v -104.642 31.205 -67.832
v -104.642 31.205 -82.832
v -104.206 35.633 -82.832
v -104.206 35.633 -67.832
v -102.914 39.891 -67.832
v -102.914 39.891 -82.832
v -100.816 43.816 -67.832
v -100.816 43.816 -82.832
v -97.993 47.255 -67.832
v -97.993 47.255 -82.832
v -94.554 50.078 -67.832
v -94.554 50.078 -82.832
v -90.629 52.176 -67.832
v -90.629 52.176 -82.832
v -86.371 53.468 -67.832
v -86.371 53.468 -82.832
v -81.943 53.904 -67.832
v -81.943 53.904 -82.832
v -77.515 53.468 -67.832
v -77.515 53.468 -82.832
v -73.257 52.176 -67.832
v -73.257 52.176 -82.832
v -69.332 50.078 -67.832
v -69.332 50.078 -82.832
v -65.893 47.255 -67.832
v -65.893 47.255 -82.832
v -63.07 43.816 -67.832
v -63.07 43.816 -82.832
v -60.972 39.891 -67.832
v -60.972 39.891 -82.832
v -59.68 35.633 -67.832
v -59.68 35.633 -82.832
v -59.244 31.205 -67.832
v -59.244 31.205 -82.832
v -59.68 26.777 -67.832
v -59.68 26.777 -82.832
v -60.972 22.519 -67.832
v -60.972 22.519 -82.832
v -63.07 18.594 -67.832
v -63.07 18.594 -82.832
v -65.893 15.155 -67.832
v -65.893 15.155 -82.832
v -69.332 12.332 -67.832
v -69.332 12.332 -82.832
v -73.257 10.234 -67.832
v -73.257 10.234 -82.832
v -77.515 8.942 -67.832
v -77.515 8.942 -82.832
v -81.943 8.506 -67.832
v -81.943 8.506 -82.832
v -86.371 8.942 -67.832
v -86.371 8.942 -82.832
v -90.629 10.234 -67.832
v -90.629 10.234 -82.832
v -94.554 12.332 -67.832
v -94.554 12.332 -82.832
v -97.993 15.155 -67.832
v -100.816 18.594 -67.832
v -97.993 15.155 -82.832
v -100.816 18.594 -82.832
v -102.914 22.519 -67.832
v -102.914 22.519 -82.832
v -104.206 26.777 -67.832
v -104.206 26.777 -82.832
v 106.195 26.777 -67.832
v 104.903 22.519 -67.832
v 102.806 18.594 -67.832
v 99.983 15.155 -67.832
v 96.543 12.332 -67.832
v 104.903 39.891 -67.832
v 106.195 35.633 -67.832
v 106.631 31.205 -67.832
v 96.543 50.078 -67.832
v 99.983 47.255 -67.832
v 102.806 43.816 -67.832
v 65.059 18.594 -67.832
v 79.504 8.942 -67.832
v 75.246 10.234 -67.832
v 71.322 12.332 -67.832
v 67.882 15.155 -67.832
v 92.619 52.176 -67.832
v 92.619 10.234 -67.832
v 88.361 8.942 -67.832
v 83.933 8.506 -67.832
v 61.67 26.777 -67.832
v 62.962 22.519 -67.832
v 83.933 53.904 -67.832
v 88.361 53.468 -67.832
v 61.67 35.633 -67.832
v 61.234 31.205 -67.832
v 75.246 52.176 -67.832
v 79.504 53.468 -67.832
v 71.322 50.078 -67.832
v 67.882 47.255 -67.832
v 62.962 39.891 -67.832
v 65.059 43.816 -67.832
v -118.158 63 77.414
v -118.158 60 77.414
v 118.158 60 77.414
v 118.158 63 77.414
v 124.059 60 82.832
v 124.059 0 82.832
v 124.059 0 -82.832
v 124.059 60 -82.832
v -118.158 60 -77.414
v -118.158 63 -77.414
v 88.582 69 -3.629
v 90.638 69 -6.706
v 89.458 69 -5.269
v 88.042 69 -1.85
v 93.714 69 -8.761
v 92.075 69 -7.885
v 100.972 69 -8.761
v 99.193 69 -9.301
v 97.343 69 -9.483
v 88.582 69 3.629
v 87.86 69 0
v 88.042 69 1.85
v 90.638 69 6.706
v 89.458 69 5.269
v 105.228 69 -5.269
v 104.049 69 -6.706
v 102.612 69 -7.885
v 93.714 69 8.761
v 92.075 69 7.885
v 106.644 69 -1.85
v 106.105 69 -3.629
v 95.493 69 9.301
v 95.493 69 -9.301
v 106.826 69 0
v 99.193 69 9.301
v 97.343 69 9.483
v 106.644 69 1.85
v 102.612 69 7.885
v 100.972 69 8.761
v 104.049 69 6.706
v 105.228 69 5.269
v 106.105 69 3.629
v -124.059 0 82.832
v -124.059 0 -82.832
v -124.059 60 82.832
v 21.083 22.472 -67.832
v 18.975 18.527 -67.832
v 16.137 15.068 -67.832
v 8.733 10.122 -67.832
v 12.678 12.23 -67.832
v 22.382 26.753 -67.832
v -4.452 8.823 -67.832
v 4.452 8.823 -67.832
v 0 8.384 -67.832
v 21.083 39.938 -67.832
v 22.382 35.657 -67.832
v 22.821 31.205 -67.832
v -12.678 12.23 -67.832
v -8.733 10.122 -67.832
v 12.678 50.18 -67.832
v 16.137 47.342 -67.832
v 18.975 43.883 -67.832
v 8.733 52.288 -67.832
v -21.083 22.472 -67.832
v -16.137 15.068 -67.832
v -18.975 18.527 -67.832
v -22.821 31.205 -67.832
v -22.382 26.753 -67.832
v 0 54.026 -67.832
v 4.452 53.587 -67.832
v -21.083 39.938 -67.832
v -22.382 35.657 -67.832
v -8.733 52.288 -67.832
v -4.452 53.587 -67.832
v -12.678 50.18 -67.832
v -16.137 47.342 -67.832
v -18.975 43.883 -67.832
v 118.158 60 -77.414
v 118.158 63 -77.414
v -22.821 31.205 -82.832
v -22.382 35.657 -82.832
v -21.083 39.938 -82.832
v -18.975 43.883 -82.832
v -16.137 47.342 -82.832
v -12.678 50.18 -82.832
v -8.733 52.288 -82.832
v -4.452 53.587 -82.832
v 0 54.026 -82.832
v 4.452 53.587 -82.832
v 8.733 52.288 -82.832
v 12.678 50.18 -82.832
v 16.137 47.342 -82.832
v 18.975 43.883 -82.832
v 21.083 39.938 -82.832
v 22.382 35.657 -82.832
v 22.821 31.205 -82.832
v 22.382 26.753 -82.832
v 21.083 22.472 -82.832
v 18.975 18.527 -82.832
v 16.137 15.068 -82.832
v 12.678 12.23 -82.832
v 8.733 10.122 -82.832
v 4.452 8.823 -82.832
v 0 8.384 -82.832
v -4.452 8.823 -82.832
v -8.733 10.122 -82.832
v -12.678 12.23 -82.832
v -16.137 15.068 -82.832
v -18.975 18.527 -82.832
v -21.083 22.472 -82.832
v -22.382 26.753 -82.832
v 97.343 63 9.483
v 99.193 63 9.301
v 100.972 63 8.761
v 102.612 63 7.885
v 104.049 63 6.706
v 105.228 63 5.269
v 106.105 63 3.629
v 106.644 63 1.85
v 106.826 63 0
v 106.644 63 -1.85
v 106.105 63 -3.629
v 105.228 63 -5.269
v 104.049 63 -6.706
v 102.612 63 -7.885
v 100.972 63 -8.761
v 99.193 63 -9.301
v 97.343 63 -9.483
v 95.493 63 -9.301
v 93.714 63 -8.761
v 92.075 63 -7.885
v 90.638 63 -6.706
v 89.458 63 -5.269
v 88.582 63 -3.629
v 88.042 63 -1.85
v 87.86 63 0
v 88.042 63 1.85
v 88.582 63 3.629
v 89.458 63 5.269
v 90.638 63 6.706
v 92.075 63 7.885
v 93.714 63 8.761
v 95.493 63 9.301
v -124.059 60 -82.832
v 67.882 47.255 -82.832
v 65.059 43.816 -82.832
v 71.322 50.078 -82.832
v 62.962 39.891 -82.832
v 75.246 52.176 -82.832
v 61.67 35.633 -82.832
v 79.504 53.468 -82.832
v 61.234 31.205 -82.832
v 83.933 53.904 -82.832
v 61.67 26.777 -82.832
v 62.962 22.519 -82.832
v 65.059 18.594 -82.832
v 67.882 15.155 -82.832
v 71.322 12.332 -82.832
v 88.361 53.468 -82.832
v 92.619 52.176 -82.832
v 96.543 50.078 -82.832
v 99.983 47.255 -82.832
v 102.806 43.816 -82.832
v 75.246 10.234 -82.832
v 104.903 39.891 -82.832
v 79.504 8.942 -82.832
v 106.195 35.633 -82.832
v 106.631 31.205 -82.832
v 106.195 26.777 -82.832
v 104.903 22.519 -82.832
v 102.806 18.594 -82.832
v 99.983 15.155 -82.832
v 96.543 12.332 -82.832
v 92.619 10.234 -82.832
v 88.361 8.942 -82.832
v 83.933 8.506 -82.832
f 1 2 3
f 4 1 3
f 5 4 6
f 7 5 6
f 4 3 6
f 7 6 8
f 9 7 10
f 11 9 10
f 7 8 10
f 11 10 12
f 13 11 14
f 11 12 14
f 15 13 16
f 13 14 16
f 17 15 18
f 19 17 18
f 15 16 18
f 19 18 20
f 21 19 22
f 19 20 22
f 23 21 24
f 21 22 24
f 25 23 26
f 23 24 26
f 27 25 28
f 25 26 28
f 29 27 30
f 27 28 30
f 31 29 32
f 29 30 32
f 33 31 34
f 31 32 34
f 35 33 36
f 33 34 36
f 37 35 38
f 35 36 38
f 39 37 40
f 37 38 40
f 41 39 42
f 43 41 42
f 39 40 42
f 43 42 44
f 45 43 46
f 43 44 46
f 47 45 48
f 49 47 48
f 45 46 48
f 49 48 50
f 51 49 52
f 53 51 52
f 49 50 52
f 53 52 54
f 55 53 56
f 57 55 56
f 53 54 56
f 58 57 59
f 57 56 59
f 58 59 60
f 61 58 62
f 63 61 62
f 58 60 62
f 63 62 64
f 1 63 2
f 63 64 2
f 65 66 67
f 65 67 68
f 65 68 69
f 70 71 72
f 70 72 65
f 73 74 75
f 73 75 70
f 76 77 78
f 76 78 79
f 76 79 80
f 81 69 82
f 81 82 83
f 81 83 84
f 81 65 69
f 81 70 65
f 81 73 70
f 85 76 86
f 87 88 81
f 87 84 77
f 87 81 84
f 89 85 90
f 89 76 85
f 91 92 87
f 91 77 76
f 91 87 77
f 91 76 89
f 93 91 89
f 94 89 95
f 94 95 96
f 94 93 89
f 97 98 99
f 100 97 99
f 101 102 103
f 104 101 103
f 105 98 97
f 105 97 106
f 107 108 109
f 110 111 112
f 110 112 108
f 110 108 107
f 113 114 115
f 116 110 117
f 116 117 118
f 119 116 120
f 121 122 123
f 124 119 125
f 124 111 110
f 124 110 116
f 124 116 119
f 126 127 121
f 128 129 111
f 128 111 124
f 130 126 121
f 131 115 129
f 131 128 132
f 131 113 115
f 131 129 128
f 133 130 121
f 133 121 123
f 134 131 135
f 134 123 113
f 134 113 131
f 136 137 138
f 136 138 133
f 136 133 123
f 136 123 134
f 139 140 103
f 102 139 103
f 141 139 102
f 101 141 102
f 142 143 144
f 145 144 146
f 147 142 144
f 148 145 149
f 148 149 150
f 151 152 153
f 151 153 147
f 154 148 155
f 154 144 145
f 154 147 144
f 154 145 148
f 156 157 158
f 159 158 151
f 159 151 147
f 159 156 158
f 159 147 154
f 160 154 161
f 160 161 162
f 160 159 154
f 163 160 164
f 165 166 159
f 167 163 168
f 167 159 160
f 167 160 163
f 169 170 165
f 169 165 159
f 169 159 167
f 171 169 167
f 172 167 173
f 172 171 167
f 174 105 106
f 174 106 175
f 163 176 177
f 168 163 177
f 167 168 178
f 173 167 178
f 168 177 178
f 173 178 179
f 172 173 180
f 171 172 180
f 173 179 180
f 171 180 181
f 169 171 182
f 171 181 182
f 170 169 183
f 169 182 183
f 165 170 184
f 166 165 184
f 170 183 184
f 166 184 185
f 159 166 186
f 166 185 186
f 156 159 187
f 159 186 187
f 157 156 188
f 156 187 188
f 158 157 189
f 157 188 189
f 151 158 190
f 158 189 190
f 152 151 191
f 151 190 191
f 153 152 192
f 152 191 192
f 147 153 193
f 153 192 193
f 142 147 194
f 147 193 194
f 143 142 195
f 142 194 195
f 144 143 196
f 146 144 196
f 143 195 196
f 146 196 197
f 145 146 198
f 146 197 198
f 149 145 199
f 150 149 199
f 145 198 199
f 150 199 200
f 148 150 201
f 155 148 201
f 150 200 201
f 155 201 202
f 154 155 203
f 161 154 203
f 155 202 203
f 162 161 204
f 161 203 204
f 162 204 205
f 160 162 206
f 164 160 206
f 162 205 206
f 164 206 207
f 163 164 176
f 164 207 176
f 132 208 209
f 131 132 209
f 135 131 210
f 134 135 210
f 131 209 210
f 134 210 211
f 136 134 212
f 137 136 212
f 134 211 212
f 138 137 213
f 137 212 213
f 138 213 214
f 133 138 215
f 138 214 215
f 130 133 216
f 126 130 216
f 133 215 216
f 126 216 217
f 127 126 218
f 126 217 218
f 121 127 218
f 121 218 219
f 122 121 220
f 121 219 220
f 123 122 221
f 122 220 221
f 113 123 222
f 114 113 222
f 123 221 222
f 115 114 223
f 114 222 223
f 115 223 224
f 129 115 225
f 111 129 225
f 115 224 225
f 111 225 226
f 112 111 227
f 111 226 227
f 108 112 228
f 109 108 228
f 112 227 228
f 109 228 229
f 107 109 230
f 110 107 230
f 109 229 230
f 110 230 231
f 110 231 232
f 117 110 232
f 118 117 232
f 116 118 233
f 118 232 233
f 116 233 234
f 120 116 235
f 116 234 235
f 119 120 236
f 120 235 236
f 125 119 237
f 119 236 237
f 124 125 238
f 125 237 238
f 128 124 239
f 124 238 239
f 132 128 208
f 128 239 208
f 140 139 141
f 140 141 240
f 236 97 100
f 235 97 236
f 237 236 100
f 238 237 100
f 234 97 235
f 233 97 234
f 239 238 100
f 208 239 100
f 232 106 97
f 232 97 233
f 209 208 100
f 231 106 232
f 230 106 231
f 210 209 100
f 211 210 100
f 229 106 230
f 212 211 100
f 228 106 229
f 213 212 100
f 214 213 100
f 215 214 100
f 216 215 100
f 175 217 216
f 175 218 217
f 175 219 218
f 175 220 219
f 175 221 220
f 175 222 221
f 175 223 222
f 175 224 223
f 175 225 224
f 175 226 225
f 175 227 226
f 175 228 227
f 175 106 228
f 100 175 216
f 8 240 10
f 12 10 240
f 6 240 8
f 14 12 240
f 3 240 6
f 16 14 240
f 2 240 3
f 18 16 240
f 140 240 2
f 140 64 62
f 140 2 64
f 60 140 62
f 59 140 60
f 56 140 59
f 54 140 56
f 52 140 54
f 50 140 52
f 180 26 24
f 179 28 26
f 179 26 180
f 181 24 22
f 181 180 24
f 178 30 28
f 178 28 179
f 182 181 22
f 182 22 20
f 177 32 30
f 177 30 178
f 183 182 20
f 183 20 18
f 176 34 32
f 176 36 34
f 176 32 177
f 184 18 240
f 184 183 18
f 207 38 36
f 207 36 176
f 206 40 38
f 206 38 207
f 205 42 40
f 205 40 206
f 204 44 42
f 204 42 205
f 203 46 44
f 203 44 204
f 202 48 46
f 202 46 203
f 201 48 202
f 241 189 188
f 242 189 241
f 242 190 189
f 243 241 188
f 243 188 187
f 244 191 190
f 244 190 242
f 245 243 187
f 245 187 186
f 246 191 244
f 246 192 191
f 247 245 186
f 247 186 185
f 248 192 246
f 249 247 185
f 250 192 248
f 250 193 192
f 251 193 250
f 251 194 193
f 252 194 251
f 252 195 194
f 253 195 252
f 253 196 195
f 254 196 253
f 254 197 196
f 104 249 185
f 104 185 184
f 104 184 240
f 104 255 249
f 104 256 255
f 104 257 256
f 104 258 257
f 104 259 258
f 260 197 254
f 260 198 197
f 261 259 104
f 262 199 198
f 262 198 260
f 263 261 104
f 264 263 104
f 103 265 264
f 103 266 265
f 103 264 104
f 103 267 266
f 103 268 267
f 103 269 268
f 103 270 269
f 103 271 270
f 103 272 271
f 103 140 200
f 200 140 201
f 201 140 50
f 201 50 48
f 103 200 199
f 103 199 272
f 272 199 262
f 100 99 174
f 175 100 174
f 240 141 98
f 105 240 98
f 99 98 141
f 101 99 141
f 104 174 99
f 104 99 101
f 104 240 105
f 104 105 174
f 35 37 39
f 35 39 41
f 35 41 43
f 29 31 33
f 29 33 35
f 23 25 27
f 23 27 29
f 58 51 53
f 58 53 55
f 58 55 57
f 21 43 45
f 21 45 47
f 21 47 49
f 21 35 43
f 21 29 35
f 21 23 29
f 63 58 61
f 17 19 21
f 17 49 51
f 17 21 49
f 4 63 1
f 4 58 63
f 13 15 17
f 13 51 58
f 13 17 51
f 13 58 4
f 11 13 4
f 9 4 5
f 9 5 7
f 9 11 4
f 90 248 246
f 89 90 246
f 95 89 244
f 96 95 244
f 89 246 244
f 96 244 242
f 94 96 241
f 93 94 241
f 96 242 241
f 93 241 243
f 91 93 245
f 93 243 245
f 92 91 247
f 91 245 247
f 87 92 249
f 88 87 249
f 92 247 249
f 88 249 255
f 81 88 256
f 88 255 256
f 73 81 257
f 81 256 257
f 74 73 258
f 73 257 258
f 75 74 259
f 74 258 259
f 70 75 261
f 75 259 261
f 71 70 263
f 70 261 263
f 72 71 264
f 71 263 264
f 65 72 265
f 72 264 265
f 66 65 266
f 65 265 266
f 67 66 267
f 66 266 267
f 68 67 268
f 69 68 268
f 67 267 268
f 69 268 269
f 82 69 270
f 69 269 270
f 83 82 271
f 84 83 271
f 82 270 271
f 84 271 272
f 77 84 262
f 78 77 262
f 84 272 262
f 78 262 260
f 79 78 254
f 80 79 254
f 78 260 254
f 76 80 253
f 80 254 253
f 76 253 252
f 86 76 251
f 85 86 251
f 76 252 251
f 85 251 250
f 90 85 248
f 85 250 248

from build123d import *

# Parameters (mm, degrees)
SKETCH1_W           = 248.117447686
SKETCH1_H           = 165.663783668
BOSS_EXTRUDE1_DEPTH = 60
SKETCH2_W           = 236.316367542
SKETCH2_H           = 154.827964942
BOSS_EXTRUDE2_DEPTH = 3
SKETCH3_R           = 9.48321581
BOSS_EXTRUDE3_DEPTH = 6
SKETCH4_R           = 22.698755204
SKETCH4_R_2         = 22.820518268
CUT_EXTRUDE1_DEPTH  = 15


with BuildPart() as part:
    # Sketch1 → Boss-Extrude1 (new body)
    with BuildSketch(Plane(origin=(0, 0, 0), x_dir=(1, 0, 0), z_dir=(0, 1, 0))):
        Rectangle(SKETCH1_W, SKETCH1_H)
    extrude(amount=BOSS_EXTRUDE1_DEPTH)

    # Sketch2 → Boss-Extrude2 (add)
    with BuildSketch(Plane(origin=(0, 60, 0), x_dir=(1, 0, 0), z_dir=(0, 1, 0))):
        Rectangle(SKETCH2_W, SKETCH2_H)
    extrude(amount=BOSS_EXTRUDE2_DEPTH)

    # Sketch3 → Boss-Extrude3 (add)
    with BuildSketch(Plane(origin=(0, 63, 0), x_dir=(1, 0, 0), z_dir=(0, 1, 0))):
        with Locations(Location((97.343283416, 0, 0), (0, 0, 270))):
            Circle(SKETCH3_R)
    extrude(amount=BOSS_EXTRUDE3_DEPTH)

    # Sketch4 → Cut-Extrude1 (cut)
    with BuildSketch(Plane(origin=(0, 0, -82.831891834), x_dir=(-1, 0, 0), z_dir=(0, 0, -1))):
        with Locations((-83.93255151, 31.205001036)):
            Circle(SKETCH4_R)
        with Locations((0, 31.205001036)):
            Circle(SKETCH4_R_2)
        with Locations((81.942967289, 31.205001036)):
            Circle(SKETCH4_R)
    extrude(amount=-CUT_EXTRUDE1_DEPTH, mode=Mode.SUBTRACT)


solid = part.part
